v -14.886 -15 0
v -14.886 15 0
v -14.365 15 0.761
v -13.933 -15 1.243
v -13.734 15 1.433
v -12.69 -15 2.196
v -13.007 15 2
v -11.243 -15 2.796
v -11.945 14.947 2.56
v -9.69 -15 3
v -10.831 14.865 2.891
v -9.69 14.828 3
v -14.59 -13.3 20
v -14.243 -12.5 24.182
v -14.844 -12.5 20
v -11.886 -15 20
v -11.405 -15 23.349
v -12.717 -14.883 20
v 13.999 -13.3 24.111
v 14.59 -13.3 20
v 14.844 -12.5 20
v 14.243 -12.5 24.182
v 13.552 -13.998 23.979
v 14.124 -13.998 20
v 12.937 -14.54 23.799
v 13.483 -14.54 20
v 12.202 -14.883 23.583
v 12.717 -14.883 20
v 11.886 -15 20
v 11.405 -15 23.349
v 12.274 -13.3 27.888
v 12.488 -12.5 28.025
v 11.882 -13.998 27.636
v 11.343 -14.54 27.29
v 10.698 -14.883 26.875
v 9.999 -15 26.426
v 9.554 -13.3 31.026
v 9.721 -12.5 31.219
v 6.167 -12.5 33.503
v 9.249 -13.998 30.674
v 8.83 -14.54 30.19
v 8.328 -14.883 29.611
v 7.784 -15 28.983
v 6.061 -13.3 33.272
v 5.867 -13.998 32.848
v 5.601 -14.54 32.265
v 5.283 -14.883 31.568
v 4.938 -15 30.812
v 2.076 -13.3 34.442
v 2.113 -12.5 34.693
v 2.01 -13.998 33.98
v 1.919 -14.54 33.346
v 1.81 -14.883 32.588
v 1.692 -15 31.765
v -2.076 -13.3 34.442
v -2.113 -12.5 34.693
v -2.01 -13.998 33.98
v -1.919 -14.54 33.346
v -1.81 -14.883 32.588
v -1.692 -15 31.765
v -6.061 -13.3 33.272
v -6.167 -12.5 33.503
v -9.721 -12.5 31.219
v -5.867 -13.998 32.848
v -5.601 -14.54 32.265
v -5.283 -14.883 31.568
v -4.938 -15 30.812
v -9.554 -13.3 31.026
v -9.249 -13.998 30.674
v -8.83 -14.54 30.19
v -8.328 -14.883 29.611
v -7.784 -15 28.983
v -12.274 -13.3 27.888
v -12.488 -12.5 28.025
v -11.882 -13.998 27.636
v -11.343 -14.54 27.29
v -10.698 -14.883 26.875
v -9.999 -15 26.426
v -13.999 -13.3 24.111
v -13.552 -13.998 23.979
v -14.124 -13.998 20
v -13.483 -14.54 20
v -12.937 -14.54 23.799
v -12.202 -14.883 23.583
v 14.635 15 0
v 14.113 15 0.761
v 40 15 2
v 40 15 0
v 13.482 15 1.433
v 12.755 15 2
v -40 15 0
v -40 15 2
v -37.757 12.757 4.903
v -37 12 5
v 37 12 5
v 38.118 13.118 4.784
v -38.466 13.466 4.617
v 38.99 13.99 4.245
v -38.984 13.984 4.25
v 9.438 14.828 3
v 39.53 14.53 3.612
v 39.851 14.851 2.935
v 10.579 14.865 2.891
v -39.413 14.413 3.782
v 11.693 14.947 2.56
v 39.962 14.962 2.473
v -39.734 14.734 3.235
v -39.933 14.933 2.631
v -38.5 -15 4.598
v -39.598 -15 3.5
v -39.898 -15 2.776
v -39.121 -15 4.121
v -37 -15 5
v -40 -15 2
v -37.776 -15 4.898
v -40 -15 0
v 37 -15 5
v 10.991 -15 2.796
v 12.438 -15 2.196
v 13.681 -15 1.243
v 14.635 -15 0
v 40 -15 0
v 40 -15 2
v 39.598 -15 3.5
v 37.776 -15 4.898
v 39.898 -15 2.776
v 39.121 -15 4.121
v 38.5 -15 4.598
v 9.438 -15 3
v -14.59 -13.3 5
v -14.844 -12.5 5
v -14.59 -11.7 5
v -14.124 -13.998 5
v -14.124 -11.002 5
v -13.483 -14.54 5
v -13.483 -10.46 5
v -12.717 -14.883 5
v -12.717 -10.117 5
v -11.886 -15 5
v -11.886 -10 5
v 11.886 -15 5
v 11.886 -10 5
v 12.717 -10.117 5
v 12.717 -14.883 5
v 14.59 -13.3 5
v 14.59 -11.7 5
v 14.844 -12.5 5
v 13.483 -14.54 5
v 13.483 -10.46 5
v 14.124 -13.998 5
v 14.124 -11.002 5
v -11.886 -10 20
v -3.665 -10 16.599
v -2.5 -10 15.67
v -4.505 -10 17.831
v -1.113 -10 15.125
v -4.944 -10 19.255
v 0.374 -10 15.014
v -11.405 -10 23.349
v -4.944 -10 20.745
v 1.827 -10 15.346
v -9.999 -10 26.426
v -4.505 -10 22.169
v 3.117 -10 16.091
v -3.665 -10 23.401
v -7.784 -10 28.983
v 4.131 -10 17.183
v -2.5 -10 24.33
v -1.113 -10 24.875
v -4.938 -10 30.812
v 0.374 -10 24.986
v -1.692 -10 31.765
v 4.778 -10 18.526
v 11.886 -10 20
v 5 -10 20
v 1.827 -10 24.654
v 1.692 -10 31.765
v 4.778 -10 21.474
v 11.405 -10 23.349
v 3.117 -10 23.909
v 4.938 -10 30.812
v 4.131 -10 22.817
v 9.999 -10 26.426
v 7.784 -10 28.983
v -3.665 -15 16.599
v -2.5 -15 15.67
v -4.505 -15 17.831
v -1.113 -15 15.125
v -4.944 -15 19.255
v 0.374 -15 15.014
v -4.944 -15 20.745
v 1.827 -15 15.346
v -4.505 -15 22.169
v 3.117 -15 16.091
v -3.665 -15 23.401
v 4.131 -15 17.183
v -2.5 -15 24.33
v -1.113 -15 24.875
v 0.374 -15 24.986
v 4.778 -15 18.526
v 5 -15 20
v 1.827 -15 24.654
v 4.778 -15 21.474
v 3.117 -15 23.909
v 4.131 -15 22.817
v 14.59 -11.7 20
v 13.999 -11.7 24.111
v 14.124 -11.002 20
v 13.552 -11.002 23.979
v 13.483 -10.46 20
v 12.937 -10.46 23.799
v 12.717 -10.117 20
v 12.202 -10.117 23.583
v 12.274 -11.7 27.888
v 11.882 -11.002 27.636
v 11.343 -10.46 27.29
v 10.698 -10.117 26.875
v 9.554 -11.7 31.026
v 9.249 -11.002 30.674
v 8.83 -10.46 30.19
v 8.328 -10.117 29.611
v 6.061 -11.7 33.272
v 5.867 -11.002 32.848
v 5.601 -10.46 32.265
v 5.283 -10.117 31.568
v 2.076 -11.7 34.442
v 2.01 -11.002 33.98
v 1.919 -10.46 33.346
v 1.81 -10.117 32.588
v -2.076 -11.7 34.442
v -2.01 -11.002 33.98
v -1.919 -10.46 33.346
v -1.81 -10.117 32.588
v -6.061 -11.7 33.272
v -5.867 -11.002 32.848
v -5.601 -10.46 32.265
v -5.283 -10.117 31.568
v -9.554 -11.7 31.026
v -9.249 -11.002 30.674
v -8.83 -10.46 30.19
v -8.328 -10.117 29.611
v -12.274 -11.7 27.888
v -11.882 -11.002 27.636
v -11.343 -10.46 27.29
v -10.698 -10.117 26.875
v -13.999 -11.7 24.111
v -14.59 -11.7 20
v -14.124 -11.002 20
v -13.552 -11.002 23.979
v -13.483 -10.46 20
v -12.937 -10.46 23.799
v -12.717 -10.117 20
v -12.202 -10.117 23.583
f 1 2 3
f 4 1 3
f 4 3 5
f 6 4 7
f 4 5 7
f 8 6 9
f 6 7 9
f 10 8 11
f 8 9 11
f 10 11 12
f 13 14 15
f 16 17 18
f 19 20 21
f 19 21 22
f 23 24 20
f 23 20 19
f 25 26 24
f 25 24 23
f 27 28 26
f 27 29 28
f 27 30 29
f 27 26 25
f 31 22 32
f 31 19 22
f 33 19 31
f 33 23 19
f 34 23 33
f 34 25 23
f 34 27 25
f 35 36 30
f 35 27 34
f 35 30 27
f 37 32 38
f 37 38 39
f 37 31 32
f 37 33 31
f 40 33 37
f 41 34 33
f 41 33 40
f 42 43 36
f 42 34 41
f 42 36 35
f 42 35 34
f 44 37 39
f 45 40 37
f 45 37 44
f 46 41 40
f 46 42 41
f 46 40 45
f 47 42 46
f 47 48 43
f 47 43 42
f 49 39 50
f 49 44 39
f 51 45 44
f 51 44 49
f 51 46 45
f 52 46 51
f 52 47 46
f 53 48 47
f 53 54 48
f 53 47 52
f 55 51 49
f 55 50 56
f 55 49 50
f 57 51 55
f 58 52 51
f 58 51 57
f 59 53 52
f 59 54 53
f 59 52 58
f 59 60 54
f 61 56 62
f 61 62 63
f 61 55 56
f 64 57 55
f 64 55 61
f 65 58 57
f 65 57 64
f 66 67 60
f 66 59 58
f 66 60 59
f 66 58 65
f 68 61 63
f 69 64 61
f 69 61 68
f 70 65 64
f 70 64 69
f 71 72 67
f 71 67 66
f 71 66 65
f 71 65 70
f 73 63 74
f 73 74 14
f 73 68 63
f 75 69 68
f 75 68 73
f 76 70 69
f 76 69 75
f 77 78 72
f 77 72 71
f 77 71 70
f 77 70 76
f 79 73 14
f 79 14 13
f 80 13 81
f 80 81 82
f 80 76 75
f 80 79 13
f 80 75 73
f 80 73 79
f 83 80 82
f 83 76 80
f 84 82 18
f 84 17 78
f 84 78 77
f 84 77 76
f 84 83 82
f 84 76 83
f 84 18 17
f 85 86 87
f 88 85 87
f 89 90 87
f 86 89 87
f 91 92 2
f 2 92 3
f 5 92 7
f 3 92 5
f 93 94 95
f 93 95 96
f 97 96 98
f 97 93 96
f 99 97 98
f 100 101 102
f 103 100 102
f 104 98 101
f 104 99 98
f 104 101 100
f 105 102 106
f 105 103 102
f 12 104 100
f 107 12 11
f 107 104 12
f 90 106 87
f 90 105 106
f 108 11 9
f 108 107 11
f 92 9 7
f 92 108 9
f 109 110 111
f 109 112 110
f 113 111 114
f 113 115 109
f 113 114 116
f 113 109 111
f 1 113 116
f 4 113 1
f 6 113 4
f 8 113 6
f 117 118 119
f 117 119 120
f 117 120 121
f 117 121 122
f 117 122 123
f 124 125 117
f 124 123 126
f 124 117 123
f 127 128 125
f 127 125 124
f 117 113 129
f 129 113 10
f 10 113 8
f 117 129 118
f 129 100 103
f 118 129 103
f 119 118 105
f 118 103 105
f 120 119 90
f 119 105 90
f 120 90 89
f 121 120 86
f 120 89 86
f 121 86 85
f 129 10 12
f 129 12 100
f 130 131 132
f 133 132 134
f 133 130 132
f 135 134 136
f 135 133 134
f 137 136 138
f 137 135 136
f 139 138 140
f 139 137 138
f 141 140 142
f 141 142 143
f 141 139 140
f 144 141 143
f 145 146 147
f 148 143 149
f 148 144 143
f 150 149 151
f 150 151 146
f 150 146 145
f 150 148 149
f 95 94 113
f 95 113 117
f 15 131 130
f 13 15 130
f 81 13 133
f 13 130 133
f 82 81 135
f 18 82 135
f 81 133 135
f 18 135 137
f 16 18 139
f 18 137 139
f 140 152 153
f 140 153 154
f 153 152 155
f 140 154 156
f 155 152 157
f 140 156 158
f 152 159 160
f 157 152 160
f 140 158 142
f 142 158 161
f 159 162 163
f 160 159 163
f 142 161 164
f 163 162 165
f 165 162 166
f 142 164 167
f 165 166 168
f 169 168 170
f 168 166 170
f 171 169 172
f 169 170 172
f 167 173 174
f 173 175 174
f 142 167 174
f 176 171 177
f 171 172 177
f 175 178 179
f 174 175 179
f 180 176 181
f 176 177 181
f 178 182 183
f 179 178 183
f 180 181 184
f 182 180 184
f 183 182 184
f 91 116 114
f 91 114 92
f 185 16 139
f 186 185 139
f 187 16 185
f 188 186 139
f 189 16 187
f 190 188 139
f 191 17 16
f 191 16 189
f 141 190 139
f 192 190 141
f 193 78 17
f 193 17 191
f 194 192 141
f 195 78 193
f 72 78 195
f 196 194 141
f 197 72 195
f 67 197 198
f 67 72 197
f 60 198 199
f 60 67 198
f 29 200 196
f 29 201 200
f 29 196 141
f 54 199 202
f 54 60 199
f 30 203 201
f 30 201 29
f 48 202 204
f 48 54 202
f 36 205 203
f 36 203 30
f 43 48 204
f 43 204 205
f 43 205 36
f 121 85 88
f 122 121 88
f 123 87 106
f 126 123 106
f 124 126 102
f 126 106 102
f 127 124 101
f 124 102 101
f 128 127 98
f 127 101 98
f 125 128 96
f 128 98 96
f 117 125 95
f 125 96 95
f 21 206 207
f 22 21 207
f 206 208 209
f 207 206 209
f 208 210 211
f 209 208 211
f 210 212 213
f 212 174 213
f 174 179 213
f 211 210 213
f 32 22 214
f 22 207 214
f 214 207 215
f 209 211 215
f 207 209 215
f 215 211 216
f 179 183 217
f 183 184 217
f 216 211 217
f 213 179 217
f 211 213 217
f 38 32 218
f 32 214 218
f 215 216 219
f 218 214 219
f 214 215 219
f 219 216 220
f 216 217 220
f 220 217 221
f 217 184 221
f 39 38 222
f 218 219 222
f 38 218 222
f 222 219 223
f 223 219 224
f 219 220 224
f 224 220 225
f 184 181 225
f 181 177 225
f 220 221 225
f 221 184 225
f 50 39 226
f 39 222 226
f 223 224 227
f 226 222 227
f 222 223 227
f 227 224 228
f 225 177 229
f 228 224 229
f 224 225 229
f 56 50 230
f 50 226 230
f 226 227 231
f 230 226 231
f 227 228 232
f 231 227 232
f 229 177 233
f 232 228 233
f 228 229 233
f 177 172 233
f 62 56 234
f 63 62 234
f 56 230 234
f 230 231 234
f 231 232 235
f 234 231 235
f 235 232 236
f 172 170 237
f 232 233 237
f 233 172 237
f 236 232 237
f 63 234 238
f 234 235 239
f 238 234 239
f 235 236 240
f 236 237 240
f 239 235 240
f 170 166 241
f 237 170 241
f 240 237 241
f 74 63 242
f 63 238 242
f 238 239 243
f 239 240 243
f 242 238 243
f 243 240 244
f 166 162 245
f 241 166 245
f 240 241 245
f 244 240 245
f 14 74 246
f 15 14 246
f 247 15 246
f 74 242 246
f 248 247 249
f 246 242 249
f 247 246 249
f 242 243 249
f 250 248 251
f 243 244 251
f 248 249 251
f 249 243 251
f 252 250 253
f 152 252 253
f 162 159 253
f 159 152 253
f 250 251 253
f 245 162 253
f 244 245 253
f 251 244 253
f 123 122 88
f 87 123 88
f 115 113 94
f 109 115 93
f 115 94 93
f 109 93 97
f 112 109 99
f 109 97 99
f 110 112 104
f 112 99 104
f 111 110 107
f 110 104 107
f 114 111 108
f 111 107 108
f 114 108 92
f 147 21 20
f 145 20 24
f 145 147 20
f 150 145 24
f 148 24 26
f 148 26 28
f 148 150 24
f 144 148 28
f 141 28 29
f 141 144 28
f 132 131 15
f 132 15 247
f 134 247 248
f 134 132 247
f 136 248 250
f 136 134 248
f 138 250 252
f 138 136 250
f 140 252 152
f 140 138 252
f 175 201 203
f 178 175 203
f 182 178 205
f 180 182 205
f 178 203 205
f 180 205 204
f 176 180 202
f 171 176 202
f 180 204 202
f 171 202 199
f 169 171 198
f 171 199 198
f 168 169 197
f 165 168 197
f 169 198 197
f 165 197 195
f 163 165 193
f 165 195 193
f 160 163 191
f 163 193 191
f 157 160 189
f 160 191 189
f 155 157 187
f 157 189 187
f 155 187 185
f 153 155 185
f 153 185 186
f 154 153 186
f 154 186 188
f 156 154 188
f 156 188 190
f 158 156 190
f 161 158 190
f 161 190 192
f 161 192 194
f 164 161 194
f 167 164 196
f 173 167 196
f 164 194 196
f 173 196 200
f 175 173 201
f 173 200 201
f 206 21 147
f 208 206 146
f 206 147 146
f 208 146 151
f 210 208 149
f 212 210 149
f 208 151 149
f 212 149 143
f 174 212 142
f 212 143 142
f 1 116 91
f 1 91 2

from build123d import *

# Parameters (mm, degrees)
F0_W          = 80
F0_H          = 30
F1_DEPTH      = 5
F2_R          = 5
F3_DEPTH      = 5
F4_W          = 29.5208403841
F4_H          = 3
F5_DEPTH      = 30.001
F6_T1_DEPTH   = 30
F7_T1_DEPTH   = 45
F7_T3_DEPTH   = 95
F7_2_T1_DEPTH = 22.5
F7_2_T4_ANGLE = 180
F7_2_T6_ANGLE = 180


# Not quite as in the source:
# - a fillet or chamfer that OpenCascade refuses, or shapes differently, is made with other operations: its cross-section is extruded or revolved along the edge and cut away or added


with BuildPart() as f1:
    # F0 (on Top) → F1 (new body)
    with BuildSketch(Plane.XY):
        Rectangle(F0_W, F0_H)
    extrude(amount=F1_DEPTH)

    # F4 (on face) → F5 (cut, through all)
    with BuildSketch(Plane.XZ.offset(15)):
        with Locations((-0.1258742996, 1.5)):
            Rectangle(F4_W, F4_H)
    extrude(amount=-F5_DEPTH, mode=Mode.SUBTRACT)

    # F6: fillet of radius 6 on 2 edges, made by hand

    # F6_s2 → F6_t1 (join)
    with BuildSketch(Plane.XZ.offset(-15)):
        with BuildLine():
            ThreePointArc((-14.8862944916, 0), (-12.6901420689, 2.1961524227), (-9.6901420689, 3))
            Line((-9.6901420689, 3), (-14.8862944916, 3))
            Line((-14.8862944916, 3), (-14.8862944916, 0))
        make_face()
        with BuildLine():
            ThreePointArc((9.4383934698, 3), (12.4383934698, 2.1961524227), (14.6345458925, 0))
            Line((14.6345458925, 0), (14.6345458925, 3))
            Line((14.6345458925, 3), (9.4383934698, 3))
        make_face()
    extrude(amount=F6_T1_DEPTH)

    # F7: fillet of radius 3 on 3 edges, made by hand

    # F7_s2 → F7_t1 (cut)
    with BuildSketch(Plane.XZ.offset(-22.5)):
        with BuildLine():
            ThreePointArc((40, 2), (39.1213203436, 4.1213203436), (37, 5))
            Line((37, 5), (40, 5))
            Line((40, 5), (40, 2))
        make_face()
        with BuildLine():
            ThreePointArc((-37, 5), (-39.1213203436, 4.1213203436), (-40, 2))
            Line((-40, 2), (-40, 5))
            Line((-40, 5), (-37, 5))
        make_face()
    extrude(amount=F7_T1_DEPTH, mode=Mode.SUBTRACT)

    # F7_s4 → F7_t3 (cut)
    with BuildSketch(Plane.YZ.offset(-47.5)):
        with BuildLine():
            ThreePointArc((12, 5), (14.1213203436, 4.1213203436), (15, 2))
            Line((15, 2), (15, 5))
            Line((15, 5), (12, 5))
        make_face()
    extrude(amount=F7_T3_DEPTH, mode=Mode.SUBTRACT)


with BuildPart() as f3:
    # F2 (on face) → F3 (new body)
    with BuildSketch(Plane.XZ.offset(15)):
        with BuildLine():
            Line((-14.8862944916, 20), (-14.8862944916, 5))
            Line((-14.8862944916, 5), (14.8862944916, 5))
            Line((14.8862944916, 5), (14.8862944916, 20))
            ThreePointArc((14.8862944916, 20), (0, 34.8862944916), (-14.8862944916, 20))
        make_face()
        with Locations((0, 20)):
            Circle(F2_R, mode=Mode.SUBTRACT)
    extrude(amount=-F3_DEPTH)

    # F7#2: fillet of radius 3 on 6 edges, made by hand

    # F7_2_s2 → F7_2_t1 (cut)
    with BuildSketch(Plane.XY.offset(-2.5)):
        with BuildLine():
            ThreePointArc((14.8862944916, -12), (14.0076148351, -14.1213203436), (11.8862944916, -15))
            Line((11.8862944916, -15), (14.8862944916, -15))
            Line((14.8862944916, -15), (14.8862944916, -12))
        make_face()
        with BuildLine():
            ThreePointArc((14.8862944916, -13), (14.0076148351, -10.8786796564), (11.8862944916, -10))
            Line((11.8862944916, -10), (14.8862944916, -10))
            Line((14.8862944916, -10), (14.8862944916, -13))
        make_face()
        with BuildLine():
            ThreePointArc((-14.8862944916, -12), (-14.0076148351, -14.1213203436), (-11.8862944916, -15))
            Line((-11.8862944916, -15), (-14.8862944916, -15))
            Line((-14.8862944916, -15), (-14.8862944916, -12))
        make_face()
        with BuildLine():
            ThreePointArc((-14.8862944916, -13), (-14.0076148351, -10.8786796564), (-11.8862944916, -10))
            Line((-11.8862944916, -10), (-14.8862944916, -10))
            Line((-14.8862944916, -10), (-14.8862944916, -13))
        make_face()
    extrude(amount=F7_2_T1_DEPTH, mode=Mode.SUBTRACT)

    # F7_2_s3 → F7_2_t4 (revolve, cut)
    with BuildSketch(Plane.XY.offset(20)):
        with BuildLine():
            ThreePointArc((14.8862944916, -12), (14.0076148351, -14.1213203436), (11.8862944916, -15))
            Line((11.8862944916, -15), (14.8862944916, -15))
            Line((14.8862944916, -15), (14.8862944916, -12))
        make_face()
    revolve(axis=Axis((0, -15, 20), (0, -1, 0)), revolution_arc=F7_2_T4_ANGLE, mode=Mode.SUBTRACT)

    # F7_2_s5 → F7_2_t6 (revolve, cut)
    with BuildSketch(Plane.XY.offset(20)):
        with BuildLine():
            ThreePointArc((14.8862944916, -13), (14.0076148351, -10.8786796564), (11.8862944916, -10))
            Line((11.8862944916, -10), (14.8862944916, -10))
            Line((14.8862944916, -10), (14.8862944916, -13))
        make_face()
    revolve(axis=Axis((0, -10, 20), (0, -1, 0)), revolution_arc=F7_2_T6_ANGLE, mode=Mode.SUBTRACT)


solid = Compound([f1.part, f3.part])
